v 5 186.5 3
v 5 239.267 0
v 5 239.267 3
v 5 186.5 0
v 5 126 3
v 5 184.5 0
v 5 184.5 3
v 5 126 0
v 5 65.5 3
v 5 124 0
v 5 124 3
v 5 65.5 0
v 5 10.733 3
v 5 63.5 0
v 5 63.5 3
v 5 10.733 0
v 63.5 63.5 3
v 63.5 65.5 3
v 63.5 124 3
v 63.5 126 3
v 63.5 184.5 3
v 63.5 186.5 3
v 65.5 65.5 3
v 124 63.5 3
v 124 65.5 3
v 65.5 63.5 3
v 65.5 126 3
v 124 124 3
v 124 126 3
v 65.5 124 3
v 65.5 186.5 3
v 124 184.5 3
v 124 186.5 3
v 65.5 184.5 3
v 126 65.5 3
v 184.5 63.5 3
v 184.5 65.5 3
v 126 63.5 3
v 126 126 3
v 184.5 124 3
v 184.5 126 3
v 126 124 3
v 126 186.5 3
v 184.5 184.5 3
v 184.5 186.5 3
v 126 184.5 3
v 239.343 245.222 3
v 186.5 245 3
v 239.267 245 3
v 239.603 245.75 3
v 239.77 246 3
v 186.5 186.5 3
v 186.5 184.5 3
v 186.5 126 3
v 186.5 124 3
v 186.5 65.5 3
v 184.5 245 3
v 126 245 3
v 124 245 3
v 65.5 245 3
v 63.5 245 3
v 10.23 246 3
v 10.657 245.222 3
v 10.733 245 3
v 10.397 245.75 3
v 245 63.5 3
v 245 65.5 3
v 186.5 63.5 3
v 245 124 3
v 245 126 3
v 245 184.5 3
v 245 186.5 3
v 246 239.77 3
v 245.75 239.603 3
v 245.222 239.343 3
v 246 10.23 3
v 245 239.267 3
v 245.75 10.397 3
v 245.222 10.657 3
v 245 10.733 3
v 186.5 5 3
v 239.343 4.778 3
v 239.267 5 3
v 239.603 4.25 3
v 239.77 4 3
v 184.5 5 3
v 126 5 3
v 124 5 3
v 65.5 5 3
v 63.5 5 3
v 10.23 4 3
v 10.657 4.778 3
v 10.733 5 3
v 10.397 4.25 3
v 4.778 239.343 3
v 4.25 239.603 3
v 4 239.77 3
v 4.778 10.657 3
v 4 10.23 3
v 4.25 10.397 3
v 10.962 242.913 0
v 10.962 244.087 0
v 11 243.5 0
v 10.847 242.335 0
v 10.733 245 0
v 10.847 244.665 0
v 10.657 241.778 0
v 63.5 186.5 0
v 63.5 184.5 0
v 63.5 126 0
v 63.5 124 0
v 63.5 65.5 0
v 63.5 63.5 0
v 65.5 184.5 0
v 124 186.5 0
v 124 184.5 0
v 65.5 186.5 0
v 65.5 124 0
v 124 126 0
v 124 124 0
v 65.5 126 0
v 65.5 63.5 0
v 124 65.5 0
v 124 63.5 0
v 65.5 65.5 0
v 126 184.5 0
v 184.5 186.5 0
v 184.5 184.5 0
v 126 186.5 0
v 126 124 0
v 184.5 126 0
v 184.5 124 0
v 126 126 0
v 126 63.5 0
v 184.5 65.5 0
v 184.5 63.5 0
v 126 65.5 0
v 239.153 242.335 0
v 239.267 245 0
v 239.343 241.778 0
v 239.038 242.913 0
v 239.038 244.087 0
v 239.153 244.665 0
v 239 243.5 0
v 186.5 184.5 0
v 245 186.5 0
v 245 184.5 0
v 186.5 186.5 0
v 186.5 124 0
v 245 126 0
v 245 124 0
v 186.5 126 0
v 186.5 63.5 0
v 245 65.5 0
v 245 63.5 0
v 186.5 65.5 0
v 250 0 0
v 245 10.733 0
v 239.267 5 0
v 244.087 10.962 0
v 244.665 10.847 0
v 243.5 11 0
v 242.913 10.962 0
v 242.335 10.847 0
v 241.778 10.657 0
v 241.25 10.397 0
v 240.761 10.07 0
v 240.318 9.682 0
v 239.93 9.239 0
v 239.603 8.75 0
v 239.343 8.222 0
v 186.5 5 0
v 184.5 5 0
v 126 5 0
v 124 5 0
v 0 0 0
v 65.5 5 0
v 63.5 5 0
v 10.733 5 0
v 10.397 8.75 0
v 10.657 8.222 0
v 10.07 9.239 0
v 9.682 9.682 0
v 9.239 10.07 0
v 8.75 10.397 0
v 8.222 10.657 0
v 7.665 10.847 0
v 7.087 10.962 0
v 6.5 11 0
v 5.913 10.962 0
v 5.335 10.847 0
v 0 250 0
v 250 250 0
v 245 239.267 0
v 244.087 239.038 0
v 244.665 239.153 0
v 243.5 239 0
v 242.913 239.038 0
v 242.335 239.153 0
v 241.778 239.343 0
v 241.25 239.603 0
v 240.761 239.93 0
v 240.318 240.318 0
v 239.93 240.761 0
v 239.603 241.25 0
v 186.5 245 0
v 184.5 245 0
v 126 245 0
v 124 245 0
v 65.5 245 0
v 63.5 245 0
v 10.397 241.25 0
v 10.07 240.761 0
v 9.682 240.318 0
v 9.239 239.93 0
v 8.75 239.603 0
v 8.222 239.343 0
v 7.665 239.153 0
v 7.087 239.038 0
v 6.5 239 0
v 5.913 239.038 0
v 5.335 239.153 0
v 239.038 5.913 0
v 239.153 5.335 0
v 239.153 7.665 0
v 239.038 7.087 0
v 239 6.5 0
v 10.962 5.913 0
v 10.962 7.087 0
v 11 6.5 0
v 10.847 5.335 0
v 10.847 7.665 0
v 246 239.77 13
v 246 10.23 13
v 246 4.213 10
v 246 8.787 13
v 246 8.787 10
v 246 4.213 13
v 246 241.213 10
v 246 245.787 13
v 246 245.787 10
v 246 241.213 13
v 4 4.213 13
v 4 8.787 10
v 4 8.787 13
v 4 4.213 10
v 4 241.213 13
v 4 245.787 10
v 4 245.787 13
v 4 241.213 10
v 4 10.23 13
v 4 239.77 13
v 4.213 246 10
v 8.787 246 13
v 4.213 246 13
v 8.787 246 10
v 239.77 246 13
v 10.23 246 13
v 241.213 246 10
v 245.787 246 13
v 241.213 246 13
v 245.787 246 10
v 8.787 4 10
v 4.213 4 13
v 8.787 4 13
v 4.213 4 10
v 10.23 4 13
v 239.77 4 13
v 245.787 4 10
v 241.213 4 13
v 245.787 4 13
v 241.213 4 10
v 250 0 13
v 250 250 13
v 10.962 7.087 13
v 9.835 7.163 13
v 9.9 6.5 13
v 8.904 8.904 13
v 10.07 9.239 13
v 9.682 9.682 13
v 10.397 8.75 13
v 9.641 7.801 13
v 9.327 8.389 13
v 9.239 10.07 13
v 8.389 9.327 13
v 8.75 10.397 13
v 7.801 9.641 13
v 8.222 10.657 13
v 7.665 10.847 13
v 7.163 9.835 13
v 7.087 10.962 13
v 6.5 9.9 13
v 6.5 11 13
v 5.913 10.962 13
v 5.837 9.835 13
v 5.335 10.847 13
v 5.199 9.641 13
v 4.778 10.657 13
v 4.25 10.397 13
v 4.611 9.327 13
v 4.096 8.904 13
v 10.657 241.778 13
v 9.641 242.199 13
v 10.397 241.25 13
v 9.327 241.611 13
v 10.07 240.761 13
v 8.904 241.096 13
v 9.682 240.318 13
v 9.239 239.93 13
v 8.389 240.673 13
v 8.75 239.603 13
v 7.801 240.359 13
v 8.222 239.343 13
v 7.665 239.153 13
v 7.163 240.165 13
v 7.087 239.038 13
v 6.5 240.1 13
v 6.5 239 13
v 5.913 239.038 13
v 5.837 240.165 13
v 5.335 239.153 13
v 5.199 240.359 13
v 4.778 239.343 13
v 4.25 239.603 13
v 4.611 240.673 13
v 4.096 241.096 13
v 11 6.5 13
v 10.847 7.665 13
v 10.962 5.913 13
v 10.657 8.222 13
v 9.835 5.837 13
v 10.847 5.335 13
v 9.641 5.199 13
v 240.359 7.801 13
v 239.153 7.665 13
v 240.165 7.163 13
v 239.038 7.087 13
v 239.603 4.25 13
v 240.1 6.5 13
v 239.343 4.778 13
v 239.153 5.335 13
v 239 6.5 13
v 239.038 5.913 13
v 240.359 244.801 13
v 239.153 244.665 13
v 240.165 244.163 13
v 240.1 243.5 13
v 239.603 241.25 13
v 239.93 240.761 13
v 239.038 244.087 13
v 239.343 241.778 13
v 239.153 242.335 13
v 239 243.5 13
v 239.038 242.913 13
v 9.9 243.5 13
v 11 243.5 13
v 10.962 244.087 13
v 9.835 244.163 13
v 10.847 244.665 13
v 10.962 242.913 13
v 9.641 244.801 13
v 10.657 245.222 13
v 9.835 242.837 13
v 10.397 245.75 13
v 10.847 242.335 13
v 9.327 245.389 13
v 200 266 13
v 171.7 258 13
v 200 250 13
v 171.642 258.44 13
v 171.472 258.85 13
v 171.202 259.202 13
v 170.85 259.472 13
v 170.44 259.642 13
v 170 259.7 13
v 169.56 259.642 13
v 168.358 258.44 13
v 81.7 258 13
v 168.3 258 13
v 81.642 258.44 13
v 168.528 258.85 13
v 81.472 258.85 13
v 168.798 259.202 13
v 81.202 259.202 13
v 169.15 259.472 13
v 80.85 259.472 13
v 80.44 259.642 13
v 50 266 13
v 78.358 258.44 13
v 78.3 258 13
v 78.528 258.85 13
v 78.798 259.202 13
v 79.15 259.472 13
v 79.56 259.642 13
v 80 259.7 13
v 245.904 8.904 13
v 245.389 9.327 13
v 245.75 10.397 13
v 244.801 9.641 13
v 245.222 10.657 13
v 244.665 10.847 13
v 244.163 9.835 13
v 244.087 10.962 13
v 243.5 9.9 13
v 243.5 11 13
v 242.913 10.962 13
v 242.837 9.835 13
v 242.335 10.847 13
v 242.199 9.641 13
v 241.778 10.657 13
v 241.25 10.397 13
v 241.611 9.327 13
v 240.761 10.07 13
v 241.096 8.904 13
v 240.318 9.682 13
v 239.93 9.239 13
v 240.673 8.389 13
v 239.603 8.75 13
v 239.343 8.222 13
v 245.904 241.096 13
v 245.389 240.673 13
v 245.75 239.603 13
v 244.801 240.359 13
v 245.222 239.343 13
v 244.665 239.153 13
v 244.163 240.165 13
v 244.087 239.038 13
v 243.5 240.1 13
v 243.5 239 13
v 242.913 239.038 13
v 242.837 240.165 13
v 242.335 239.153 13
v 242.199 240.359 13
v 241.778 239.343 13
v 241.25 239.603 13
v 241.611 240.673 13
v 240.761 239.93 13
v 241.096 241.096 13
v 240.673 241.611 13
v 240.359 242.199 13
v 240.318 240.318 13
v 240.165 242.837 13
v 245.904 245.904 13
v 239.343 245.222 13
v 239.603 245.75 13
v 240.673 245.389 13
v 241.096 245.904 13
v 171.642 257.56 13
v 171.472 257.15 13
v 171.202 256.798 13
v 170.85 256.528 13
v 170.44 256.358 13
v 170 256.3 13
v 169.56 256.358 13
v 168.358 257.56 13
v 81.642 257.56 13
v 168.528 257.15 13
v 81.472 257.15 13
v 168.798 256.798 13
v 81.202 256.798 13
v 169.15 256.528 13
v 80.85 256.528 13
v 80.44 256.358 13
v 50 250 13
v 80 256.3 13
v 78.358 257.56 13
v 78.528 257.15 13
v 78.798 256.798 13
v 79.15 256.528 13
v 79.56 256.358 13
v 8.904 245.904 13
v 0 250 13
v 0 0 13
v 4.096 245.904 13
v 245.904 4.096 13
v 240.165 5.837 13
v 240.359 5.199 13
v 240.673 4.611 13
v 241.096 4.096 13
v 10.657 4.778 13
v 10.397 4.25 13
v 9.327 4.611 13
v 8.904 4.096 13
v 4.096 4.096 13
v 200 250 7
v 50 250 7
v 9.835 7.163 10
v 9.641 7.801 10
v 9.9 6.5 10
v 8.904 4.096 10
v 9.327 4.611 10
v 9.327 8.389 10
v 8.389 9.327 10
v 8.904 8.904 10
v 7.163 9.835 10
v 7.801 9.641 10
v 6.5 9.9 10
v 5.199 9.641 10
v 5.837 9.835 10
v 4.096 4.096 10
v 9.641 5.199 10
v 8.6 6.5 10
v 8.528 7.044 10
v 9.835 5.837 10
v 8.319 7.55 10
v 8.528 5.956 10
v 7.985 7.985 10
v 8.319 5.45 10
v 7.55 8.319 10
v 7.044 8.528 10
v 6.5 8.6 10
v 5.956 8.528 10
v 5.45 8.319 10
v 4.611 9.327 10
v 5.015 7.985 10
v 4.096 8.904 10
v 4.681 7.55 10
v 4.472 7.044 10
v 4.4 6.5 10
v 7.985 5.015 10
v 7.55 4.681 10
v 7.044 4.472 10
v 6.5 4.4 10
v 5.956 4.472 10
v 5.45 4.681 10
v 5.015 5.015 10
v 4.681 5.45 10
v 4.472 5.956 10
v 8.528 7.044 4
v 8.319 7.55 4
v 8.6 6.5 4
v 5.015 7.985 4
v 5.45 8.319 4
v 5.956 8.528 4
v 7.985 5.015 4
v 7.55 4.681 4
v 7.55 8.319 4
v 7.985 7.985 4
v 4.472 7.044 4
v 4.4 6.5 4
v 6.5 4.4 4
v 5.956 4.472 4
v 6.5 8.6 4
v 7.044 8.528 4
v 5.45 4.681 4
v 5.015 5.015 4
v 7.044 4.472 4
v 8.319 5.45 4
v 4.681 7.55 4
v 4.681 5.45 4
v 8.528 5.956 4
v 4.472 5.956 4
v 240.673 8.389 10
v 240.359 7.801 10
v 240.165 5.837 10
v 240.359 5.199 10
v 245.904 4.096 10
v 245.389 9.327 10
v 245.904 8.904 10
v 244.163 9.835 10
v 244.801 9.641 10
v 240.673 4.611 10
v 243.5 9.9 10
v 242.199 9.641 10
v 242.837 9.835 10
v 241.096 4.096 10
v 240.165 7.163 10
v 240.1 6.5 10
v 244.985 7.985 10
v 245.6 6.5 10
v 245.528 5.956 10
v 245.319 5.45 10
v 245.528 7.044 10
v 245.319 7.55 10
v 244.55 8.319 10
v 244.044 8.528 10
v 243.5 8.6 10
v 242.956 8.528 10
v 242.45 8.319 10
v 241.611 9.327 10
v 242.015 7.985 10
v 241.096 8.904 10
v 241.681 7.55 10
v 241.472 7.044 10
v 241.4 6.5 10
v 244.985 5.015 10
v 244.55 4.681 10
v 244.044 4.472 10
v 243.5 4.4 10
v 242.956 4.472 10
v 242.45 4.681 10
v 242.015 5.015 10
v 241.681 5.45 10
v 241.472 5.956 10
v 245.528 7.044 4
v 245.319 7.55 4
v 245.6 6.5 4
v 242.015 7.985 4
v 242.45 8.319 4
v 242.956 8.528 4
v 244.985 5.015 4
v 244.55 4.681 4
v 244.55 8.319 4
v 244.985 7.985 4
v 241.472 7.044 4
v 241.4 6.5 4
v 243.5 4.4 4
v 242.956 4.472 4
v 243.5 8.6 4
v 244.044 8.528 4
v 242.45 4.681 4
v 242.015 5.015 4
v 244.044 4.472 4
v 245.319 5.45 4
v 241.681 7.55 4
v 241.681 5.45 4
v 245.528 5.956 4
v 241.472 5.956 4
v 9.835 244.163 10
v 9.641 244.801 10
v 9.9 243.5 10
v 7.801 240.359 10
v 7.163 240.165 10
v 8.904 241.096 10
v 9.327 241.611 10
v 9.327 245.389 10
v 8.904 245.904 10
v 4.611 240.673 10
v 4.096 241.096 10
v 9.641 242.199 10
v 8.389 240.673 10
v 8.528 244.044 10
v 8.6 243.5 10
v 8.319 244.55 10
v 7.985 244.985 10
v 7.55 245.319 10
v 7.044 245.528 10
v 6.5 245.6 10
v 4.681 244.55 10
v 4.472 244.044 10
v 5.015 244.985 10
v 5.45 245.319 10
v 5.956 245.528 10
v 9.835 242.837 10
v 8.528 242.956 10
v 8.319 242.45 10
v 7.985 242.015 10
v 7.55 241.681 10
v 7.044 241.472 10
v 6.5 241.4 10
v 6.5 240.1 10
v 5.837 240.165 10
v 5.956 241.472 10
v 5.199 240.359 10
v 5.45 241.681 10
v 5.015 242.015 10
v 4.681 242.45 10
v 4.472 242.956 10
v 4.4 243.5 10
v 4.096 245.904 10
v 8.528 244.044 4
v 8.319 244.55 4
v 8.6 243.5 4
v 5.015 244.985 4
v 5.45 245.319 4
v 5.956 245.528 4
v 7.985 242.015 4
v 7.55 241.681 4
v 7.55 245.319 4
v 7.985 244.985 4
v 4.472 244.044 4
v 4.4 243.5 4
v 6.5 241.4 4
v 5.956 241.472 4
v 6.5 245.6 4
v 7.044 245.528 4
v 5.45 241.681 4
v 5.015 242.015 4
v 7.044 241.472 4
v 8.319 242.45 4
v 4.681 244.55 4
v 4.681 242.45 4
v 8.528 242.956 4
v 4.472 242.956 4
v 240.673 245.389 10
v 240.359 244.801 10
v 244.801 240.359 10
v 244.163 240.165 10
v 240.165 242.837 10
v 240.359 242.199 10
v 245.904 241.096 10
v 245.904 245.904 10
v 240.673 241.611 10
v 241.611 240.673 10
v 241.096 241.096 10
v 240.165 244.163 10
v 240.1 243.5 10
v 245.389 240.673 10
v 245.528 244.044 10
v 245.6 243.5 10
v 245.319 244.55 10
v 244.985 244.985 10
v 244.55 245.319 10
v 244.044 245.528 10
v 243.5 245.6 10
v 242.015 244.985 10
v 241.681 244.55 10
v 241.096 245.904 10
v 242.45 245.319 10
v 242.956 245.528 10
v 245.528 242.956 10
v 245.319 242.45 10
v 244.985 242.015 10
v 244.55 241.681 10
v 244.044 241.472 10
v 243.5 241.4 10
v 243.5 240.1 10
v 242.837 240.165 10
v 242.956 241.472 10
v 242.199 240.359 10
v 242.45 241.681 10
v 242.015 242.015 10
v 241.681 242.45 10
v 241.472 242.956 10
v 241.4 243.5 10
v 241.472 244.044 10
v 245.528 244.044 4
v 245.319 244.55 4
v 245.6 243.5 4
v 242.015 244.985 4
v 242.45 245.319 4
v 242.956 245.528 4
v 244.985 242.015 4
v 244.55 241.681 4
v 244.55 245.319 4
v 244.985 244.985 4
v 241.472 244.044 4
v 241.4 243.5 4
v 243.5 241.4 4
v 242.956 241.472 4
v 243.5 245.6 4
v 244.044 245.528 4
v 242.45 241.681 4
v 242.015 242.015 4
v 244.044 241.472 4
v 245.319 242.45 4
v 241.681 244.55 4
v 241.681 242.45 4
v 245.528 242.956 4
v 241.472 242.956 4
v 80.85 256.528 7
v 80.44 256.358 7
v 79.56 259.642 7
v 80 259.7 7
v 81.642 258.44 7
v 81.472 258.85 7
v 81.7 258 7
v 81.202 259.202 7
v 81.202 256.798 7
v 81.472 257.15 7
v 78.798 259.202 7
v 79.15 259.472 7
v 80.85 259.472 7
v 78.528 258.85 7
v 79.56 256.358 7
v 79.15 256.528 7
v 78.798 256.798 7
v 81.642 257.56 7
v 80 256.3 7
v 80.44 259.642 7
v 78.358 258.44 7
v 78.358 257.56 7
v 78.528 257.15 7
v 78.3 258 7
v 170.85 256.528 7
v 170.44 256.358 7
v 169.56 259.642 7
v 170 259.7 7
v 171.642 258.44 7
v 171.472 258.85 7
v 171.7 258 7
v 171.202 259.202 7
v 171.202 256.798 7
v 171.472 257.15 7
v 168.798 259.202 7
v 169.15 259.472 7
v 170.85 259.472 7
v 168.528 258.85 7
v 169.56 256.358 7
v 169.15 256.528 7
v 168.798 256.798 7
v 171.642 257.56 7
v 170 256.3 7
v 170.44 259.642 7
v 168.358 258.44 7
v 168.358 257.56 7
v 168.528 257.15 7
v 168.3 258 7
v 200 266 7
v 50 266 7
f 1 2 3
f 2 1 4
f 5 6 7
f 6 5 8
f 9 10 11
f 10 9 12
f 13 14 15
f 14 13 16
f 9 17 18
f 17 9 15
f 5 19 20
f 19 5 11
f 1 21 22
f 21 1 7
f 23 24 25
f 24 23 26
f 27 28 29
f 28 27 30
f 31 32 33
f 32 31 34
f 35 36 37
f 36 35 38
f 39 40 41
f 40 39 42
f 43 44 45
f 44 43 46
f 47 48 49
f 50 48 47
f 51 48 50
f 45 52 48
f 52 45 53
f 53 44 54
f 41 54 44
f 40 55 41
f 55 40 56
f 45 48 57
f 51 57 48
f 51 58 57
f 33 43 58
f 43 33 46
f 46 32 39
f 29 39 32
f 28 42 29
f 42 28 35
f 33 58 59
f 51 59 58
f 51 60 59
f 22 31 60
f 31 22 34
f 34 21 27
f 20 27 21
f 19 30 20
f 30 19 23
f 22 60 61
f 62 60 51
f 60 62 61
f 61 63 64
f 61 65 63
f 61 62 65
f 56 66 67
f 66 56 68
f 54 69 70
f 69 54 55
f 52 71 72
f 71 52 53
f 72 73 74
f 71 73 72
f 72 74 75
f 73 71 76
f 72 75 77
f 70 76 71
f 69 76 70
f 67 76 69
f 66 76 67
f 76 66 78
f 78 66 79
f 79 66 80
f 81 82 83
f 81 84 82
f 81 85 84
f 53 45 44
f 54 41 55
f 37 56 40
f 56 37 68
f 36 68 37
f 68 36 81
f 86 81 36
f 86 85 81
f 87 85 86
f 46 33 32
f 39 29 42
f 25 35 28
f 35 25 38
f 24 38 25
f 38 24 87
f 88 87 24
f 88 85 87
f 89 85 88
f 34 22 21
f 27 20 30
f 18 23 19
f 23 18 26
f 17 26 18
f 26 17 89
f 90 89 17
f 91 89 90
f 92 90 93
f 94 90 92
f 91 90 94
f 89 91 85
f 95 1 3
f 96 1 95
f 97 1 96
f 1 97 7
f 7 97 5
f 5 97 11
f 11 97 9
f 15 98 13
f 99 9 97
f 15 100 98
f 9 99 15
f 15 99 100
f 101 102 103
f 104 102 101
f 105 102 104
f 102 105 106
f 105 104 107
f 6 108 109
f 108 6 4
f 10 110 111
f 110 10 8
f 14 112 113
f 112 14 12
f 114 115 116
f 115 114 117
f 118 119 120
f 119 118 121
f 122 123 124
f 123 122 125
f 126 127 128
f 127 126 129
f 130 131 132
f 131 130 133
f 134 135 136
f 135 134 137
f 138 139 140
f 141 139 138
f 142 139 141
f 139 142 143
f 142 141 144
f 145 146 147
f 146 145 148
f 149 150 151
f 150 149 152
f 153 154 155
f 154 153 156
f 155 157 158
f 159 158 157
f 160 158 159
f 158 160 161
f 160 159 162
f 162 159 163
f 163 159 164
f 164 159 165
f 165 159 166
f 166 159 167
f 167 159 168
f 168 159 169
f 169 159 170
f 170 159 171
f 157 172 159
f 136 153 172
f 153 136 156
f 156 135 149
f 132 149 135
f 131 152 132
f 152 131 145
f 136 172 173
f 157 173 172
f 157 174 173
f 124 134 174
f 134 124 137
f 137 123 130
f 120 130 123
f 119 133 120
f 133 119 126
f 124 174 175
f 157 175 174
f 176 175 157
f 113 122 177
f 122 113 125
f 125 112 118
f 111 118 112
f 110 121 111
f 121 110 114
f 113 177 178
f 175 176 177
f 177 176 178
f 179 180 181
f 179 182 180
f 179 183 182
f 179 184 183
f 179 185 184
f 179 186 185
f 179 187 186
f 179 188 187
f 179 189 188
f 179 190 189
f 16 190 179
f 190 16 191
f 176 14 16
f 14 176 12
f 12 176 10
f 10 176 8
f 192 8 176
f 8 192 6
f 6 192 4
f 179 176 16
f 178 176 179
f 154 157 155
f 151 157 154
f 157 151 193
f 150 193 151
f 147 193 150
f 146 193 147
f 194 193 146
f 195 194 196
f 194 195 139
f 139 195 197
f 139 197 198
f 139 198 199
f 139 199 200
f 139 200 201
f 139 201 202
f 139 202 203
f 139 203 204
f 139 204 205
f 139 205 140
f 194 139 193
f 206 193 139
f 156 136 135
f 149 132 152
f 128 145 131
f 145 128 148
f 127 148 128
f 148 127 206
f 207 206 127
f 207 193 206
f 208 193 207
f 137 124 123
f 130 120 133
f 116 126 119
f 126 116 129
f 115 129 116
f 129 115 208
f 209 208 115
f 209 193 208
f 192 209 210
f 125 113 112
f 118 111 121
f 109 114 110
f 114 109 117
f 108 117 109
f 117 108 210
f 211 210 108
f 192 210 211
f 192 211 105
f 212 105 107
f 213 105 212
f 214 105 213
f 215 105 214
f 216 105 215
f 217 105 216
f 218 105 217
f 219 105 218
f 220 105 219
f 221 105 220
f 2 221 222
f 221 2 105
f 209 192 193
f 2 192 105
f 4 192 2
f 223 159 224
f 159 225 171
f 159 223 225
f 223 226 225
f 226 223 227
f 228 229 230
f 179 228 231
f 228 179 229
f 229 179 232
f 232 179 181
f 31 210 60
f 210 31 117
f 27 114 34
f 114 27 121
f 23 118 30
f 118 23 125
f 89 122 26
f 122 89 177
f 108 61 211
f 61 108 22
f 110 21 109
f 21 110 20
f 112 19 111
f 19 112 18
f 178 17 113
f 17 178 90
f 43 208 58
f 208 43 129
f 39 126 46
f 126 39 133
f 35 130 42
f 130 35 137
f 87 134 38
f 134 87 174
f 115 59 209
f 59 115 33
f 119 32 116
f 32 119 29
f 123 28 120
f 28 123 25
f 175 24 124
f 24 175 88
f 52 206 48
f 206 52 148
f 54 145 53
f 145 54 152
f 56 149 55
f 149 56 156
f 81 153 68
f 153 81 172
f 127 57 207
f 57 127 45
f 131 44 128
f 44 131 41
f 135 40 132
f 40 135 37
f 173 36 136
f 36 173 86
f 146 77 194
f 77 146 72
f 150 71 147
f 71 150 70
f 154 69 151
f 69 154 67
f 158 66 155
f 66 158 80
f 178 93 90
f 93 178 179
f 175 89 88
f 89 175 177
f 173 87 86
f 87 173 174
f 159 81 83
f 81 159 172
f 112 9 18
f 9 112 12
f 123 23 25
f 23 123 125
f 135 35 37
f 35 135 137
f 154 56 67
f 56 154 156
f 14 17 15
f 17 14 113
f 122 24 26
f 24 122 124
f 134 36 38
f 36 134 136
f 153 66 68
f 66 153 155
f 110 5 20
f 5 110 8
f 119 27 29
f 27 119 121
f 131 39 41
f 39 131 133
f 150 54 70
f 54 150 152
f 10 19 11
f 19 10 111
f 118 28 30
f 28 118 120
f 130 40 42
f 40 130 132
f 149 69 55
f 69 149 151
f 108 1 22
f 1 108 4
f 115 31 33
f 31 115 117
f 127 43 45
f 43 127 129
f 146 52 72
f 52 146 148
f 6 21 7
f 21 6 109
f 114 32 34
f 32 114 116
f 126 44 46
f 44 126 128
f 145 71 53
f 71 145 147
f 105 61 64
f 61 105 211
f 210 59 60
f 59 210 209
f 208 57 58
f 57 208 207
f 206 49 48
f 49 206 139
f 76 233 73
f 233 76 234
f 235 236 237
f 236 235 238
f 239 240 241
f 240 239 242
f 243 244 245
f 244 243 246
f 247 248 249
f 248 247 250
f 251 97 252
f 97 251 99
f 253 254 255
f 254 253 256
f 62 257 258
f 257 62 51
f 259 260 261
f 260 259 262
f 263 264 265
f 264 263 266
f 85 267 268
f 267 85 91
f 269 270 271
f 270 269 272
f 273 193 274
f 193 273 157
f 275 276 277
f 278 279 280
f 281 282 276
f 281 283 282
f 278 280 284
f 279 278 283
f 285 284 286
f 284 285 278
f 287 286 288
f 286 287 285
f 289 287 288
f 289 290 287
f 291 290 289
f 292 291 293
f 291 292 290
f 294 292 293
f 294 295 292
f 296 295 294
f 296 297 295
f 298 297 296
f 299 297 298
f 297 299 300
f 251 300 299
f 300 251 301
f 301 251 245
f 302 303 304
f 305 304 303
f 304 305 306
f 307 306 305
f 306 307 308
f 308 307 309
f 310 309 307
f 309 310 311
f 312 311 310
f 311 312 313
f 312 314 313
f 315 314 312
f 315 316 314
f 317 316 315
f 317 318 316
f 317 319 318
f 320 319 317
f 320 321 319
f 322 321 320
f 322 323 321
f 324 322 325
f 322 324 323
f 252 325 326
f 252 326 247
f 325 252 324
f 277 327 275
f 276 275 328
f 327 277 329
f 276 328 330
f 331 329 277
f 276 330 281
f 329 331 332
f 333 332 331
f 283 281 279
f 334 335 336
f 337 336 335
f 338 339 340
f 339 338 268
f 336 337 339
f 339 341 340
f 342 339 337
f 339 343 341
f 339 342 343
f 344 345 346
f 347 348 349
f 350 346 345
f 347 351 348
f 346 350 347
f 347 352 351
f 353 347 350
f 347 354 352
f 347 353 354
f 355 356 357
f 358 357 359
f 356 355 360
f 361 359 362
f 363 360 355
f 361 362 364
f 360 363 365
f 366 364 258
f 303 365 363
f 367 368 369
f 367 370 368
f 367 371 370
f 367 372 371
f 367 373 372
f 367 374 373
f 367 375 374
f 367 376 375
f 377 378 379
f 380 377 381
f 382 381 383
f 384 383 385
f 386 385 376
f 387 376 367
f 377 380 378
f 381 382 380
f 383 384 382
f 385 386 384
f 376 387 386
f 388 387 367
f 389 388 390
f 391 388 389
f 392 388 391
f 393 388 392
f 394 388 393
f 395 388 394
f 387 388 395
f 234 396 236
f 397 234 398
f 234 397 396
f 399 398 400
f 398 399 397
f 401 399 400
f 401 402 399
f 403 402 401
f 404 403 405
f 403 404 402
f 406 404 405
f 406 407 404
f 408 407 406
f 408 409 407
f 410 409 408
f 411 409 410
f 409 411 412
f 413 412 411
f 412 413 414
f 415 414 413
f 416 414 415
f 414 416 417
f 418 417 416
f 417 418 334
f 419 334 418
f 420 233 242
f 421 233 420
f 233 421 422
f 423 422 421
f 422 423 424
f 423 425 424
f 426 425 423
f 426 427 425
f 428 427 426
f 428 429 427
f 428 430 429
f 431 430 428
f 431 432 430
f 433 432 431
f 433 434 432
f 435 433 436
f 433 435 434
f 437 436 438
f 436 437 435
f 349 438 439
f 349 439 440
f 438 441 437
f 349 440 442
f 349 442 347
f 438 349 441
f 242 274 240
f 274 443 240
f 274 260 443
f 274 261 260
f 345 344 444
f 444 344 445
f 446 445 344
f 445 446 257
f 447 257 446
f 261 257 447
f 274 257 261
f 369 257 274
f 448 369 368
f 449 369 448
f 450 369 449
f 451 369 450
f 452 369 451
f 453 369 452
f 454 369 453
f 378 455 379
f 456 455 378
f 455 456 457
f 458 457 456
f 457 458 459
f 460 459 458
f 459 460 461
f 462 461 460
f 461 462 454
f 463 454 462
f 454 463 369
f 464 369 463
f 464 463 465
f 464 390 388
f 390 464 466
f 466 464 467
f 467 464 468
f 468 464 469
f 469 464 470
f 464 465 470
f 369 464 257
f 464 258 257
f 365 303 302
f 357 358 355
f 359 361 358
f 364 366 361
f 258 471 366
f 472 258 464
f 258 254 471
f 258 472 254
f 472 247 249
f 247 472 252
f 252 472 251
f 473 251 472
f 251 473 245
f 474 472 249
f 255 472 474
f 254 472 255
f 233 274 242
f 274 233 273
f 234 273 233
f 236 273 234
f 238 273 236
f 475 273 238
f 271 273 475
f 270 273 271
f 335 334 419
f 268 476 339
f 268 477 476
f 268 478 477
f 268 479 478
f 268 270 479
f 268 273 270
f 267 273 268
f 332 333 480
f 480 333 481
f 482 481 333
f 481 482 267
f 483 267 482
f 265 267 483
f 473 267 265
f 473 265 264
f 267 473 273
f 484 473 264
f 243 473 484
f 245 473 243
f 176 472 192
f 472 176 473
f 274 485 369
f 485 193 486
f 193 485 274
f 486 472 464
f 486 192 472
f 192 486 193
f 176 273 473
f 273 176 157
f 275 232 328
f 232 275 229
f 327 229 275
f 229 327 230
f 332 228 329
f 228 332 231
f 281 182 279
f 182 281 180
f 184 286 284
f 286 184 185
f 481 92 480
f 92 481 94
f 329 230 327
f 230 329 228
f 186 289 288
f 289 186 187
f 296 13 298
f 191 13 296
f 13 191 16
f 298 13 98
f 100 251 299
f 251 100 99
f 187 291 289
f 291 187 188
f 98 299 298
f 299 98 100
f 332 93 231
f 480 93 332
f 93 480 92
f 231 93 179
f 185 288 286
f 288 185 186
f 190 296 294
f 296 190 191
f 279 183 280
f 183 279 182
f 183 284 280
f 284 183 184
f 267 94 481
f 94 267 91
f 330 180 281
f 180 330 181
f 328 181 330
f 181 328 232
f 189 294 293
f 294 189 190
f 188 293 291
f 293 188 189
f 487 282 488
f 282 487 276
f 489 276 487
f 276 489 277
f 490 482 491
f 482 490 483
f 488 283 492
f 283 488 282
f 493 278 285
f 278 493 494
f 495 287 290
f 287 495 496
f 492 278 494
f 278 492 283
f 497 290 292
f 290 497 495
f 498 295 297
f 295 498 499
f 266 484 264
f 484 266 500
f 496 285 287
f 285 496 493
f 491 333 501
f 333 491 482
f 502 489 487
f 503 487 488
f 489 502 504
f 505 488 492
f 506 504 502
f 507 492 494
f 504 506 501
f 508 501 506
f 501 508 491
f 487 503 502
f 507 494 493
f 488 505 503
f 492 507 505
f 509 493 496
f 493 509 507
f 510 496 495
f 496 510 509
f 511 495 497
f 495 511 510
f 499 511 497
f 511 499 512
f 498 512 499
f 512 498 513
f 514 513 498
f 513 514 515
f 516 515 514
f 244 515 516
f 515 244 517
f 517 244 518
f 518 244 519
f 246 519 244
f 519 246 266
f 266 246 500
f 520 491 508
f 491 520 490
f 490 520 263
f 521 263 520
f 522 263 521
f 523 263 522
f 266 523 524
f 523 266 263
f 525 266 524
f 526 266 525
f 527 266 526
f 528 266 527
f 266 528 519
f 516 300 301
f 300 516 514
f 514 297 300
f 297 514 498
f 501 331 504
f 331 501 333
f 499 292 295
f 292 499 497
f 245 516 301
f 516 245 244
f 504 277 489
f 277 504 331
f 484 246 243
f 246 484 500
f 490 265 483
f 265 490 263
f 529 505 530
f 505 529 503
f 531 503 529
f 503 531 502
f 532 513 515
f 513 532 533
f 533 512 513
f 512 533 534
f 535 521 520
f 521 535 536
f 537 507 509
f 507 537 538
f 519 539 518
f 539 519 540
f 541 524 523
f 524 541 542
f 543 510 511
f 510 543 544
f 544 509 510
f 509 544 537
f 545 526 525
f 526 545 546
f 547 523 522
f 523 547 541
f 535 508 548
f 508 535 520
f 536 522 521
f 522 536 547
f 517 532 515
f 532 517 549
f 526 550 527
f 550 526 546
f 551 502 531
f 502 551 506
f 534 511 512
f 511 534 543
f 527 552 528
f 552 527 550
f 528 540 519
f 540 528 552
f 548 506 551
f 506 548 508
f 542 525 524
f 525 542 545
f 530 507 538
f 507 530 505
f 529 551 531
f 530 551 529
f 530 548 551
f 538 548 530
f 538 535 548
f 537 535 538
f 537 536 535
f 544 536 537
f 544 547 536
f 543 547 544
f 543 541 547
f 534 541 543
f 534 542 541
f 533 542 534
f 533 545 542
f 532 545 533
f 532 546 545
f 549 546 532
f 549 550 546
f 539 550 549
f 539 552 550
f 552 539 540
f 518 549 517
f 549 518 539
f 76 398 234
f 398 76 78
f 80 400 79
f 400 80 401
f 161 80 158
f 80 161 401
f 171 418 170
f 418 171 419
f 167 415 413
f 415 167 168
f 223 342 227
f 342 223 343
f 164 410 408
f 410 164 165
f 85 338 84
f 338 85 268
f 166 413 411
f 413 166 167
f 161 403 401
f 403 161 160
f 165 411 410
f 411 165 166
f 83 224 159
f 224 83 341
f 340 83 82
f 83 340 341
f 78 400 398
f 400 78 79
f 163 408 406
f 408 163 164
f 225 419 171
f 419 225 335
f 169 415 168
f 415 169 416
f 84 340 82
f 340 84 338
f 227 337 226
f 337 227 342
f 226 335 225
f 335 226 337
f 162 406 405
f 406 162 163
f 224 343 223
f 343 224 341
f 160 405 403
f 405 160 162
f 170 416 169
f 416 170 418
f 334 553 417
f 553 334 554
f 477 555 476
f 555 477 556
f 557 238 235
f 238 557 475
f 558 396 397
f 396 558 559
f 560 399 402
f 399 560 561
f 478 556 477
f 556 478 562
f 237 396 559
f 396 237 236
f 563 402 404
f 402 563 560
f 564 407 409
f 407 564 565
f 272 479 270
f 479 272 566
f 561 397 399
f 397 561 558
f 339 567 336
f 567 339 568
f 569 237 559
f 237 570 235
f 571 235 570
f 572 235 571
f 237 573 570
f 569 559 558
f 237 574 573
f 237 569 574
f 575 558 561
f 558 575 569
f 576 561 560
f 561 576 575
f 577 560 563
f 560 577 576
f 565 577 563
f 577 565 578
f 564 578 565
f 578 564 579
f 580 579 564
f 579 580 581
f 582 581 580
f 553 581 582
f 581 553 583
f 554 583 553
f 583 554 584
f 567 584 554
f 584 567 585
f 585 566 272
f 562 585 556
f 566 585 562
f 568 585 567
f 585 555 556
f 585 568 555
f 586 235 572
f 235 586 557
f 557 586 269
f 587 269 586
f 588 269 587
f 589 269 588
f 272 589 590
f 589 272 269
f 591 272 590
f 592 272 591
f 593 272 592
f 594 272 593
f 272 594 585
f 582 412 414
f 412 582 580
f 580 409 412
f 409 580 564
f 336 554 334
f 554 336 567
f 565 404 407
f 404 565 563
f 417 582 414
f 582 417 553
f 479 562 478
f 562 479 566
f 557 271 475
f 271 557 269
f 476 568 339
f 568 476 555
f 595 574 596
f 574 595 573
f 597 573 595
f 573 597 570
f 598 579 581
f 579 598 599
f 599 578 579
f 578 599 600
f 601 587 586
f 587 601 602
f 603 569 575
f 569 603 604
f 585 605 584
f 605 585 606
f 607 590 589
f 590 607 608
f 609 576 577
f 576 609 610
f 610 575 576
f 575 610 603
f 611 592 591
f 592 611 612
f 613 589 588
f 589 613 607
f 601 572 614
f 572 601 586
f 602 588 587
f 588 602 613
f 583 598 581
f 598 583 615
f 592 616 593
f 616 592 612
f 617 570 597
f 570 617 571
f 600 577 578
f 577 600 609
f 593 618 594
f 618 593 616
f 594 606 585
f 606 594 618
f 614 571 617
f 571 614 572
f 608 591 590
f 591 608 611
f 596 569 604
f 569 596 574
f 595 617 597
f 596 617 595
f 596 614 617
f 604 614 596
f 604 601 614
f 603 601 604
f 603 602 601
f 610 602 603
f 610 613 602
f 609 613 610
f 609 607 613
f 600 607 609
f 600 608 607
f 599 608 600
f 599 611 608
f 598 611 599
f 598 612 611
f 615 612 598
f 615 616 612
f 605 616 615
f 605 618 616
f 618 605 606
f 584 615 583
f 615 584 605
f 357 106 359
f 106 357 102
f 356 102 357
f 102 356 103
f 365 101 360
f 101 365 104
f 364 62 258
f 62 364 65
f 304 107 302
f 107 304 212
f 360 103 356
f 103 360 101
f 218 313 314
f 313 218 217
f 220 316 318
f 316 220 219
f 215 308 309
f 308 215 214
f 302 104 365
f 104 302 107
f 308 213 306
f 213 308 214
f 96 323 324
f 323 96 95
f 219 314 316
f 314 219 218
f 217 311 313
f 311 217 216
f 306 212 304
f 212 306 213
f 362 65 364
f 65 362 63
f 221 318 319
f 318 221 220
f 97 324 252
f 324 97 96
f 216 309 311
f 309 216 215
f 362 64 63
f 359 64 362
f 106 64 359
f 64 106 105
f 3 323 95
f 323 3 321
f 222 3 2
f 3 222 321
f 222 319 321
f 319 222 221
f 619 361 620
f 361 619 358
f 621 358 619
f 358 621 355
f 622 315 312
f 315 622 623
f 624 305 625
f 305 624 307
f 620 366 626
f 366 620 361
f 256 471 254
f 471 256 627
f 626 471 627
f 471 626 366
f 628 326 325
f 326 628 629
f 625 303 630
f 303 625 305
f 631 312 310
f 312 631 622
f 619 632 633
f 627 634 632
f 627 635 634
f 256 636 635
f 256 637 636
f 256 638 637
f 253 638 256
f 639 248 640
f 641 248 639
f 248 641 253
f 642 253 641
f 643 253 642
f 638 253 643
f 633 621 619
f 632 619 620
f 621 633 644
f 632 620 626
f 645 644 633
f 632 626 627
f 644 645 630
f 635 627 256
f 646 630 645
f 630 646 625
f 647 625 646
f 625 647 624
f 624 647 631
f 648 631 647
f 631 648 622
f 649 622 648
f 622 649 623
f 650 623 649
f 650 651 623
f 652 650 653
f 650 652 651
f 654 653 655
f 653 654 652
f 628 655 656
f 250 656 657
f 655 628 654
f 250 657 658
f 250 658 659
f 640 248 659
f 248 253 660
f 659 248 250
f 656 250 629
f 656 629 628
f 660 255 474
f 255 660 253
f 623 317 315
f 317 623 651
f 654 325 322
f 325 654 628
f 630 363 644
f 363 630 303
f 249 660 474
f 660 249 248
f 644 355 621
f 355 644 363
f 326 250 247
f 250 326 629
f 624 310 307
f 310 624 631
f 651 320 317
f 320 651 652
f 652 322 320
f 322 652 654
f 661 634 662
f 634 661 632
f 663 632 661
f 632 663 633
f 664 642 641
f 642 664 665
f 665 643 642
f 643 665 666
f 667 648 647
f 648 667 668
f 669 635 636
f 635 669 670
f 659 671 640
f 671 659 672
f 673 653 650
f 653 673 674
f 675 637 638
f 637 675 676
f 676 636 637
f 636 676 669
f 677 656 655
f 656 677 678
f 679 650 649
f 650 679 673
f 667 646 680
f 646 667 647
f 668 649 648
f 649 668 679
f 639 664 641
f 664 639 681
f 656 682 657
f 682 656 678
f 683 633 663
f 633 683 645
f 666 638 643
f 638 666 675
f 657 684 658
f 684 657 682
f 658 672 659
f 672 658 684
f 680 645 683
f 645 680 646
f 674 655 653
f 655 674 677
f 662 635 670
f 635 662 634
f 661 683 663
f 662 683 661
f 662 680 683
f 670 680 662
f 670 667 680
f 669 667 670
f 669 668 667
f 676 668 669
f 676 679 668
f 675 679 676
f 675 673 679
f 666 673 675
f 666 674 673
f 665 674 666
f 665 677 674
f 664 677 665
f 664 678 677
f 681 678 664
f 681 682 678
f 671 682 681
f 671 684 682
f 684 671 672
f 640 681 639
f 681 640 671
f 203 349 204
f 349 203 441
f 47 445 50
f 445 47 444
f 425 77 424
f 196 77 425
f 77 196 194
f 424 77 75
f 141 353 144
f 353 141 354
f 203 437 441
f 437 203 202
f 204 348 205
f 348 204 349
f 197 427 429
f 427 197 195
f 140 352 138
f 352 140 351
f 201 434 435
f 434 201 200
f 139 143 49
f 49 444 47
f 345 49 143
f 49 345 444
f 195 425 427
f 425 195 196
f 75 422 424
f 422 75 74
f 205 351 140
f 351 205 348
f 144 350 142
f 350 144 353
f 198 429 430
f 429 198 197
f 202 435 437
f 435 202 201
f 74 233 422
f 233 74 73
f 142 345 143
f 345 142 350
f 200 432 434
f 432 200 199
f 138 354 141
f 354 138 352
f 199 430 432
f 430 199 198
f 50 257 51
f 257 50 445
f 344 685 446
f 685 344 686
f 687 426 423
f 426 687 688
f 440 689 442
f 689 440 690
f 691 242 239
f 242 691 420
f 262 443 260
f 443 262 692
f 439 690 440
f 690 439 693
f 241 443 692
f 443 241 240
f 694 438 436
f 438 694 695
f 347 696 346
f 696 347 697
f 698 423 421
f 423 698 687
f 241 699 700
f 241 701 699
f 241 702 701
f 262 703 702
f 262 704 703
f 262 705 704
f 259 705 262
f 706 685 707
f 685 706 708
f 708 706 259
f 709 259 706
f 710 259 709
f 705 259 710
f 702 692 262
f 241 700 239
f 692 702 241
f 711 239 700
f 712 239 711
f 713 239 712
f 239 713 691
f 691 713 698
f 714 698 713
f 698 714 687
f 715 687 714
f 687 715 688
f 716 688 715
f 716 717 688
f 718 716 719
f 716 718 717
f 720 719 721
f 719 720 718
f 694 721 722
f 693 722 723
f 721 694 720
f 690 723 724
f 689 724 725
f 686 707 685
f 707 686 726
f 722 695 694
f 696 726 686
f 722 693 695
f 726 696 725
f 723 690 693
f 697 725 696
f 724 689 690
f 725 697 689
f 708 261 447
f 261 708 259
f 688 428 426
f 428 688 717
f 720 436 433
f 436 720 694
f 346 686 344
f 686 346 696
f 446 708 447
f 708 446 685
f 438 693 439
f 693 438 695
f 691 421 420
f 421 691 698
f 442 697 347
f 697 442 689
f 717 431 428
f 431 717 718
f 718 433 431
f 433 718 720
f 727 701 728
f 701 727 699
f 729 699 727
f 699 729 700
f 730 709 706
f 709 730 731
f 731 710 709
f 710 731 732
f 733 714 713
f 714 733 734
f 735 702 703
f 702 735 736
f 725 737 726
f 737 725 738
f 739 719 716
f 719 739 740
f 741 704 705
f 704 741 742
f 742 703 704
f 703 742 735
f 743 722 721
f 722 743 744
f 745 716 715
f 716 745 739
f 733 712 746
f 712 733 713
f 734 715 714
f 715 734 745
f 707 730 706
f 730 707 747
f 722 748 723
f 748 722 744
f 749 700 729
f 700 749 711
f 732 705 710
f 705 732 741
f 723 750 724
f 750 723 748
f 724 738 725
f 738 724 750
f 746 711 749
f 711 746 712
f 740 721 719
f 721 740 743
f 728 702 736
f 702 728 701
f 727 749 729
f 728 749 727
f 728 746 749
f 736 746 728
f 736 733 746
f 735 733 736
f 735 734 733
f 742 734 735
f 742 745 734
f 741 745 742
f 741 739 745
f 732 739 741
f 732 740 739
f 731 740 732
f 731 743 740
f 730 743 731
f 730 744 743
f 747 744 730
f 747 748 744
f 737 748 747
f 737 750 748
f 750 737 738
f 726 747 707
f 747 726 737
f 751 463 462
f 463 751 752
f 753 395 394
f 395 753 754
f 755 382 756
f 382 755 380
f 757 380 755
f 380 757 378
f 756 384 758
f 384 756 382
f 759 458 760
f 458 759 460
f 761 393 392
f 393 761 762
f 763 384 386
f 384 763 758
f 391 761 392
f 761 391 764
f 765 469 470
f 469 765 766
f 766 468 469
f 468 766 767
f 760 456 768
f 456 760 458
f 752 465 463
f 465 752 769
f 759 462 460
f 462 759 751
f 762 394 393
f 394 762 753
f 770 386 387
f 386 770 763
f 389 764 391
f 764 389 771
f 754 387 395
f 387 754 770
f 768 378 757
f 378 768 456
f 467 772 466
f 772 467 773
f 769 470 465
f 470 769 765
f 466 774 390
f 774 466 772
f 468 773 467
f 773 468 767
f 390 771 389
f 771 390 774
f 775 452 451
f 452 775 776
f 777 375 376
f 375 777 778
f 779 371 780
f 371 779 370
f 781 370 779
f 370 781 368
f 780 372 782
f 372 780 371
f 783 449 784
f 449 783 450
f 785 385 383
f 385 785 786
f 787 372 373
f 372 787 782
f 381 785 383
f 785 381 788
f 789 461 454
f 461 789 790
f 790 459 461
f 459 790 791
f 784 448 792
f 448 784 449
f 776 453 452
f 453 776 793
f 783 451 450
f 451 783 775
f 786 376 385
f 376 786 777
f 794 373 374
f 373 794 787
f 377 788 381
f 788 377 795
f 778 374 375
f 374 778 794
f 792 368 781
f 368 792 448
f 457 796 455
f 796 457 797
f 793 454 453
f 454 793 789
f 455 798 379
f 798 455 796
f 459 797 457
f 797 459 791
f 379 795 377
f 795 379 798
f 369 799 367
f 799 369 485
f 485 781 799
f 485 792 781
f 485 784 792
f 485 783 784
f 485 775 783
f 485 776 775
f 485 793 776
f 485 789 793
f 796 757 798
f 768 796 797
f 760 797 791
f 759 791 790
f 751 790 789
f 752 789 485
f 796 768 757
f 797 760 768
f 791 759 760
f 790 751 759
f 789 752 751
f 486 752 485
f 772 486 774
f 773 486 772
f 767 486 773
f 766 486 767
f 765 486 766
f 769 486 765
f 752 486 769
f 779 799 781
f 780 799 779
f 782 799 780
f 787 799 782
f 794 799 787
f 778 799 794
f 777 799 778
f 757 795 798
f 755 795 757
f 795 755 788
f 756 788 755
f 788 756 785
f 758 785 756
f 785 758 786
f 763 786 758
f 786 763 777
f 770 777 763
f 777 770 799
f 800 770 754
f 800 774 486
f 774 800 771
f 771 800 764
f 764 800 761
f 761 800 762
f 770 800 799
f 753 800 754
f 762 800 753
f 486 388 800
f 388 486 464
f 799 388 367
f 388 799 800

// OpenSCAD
// =====================================================================
// FUZE / Helios — Down Sandwich Test Frame  (V3 clamshell, 2026-06-04)
// Two separate halves, NO printed hinge. Lift the lid right off to lay an
// even layer of free-form down in the tray; set the lid back (a perimeter
// set the lid back and clamp with 4 corner screws. Mesh on BOTH outer
// faces. Hangs vertically: a top rail slides into a side-loading C-channel.
//
//   PART = "tray"    -> deep half (10 mm down cavity)        [print 1]
//   PART = "lid"     -> mesh lid half                        [print 1]
//   PART = "channel" -> side-loading C-channel (load cell)   [print 1]
//   PART = "both"    -> tray + lid + channel preview
//
// Material: PC (PETG later). Print each half FLAT, mesh-face DOWN.
// MESH: pause-embed at layer 8 = Z 1.5 mm @ 0.2 mm layers (both halves).
// =====================================================================

PART = "tray";
$fn = 48;

SIZE     = 250;     // outer square (mm)
WALL     = 4;       // frame wall thickness
CAV      = 10;      // down cavity depth (tray)
FLOOR_H  = 3.0;     // mesh-support rib plane (1.5 backing + 1.5 cap, mesh @ layer 8)
RIB_W    = 2.0;     // rib width
CELLS    = 4;       // NxN support-rib cells
CLR      = 0.4;     // fit clearance

TRAY_T = FLOOR_H + CAV;   // tray wall height (13)
LID_RIM = 5.0;            // lid wall height
LID_T   = FLOOR_H + LID_RIM;


// corner closure screws (M3)
SCREW_CLR = 3.4;    // clearance hole (lid)
INSERT_D  = 4.2;    // M3 heat-set insert bore (tray)
INSERT_H  = 6.0;
BOSS_D    = 9;
INSET     = BOSS_D/2 + 2;   // boss center inset from the corner

// top hang tab (flat, in the plane of the frame, sticks OUT past the top edge so
// it never conflicts with the lid) + side-loading C-channel that grips the tab.
RAIL_LEN = 150;   // tab width along the top edge (X)
RAIL_OUT = 16;    // how far the tab sticks out past the top edge (Y)
RAIL_T   = 6;     // tab thickness (Z) — what the channel grips
CH_CLR = 0.5; CH_WALL = 3; CH_LEN = RAIL_LEN + 30;
// load-cell mount boss — stepped standoff on the BACK face (the face OPPOSITE the slot),
// so it mounts up to the load cell with the frame hanging straight down below it.
LC_TIP_W   = 8;     // tip width along the channel (X) — seats in the 8 mm gap between the load-cell screws
LC_BASE_W  = 16;    // shoulder width (X)
LC_TIP_ZH  = 8;     // tip height (Z)
LC_BASE_ZH = 10;    // shoulder height (Z)
LC_BASE_H  = 10;    // shoulder protrusion off the back face (+Y) — clears the 10 mm safety screw
LC_TIP_H   = 12;    // tip protrusion (+Y) total
LC_SCREW_D = 5.5;   // attach-screw clearance — SET to your load-cell thread (M5=5.5, M4=4.5, M6=6.5)
LC_HEAD_D  = 10;    // screw-head recess Ø
LC_HEAD_H  = 2.8;   // screw-head recess depth
// locking pins: 2 holes through channel-lip + tab + channel-lip; drop M3 screws/pins
LOCK_D    = 3.4;          // M3 clearance / 3 mm pin
LOCK_SP   = 90;           // spacing between the 2 lock holes
LOCK_Y    = RAIL_OUT/2;   // depth into the tab where the holes sit

WIN = SIZE - 2*WALL;
EPS = 0.01;

// ---------------------------------------------------------------
module sq(s,h){ cube([s,s,h]); }

module rib_grid(h){
    step = WIN/CELLS;
    intersection(){
        union(){
            for(i=[0:CELLS]) translate([i*step-RIB_W/2,0,0]) cube([RIB_W,WIN,h]);
            for(j=[0:CELLS]) translate([0,j*step-RIB_W/2,0]) cube([WIN,RIB_W,h]);
        }
        cube([WIN,WIN,h]);
    }
}
module ring(h){ difference(){ sq(SIZE,h); translate([WALL,WALL,-EPS]) sq(WIN,h+2*EPS);} }

// 4 corner positions
function corners() = [[INSET,INSET],[SIZE-INSET,INSET],[INSET,SIZE-INSET],[SIZE-INSET,SIZE-INSET]];

// registration via the corner bosses: lid POST drops into tray SOCKET, then screw.
// Socket and post are DECOUPLED so the post can shrink without re-cutting the tray.
REG_SOCKET_D = 6.8;   // TRAY socket diameter — UNCHANGED (matches the 6 trays already printed)
REG_POST_D   = 5.8;   // LID post diameter — loose slip fit (~0.5mm/side; was 6.5 = too tight)
REG_H        = 3.0;   // engagement depth (socket depth = post height)

module tray_bosses(){          // socket on top (receives the lid post) + insert below it
    for(c=corners()) translate([c[0],c[1],0])
        difference(){
            cylinder(d=BOSS_D,h=TRAY_T);
            translate([0,0,TRAY_T-REG_H]) cylinder(d=REG_SOCKET_D, h=REG_H+EPS, $fn=32);           // registration socket
            translate([0,0,TRAY_T-REG_H-INSERT_H]) cylinder(d=INSERT_D, h=INSERT_H+EPS, $fn=24);   // heat-set insert bore (below socket)
        }
}
module lid_bosses(){           // boss + registration POST above the mating face; screw hole through
    for(c=corners()) translate([c[0],c[1],0])
        difference(){
            union(){ cylinder(d=BOSS_D,h=LID_T); translate([0,0,LID_T-EPS]) cylinder(d=REG_POST_D, h=REG_H+EPS, $fn=32); }
            translate([0,0,-EPS]) cylinder(d=SCREW_CLR, h=LID_T+REG_H+2*EPS, $fn=24);
        }
}

// Flat hang tab: a plate sticking OUT past the top edge (+Y), thickness in Z.
// Sits at the top of the tray wall so the lid (which stacks in +Z) clears it.
module hang_tab(){
    difference(){
        translate([(SIZE-RAIL_LEN)/2, SIZE-EPS, TRAY_T-RAIL_T])
            cube([RAIL_LEN, RAIL_OUT+EPS, RAIL_T]);
        for(sx=[SIZE/2-LOCK_SP/2, SIZE/2+LOCK_SP/2])
            translate([sx, SIZE+LOCK_Y, TRAY_T-RAIL_T-EPS]) cylinder(d=LOCK_D, h=RAIL_T+2*EPS, $fn=24);
    }
}
// C-channel grips the tab top+bottom (Z) and the back (Y); the tab slides in from
// one X end to an end-stop; the front (toward the frame) is open so the neck passes.
module c_channel(){
    slotY = RAIL_OUT + CH_CLR;            // tab depth into the channel (Y)
    slotZ = RAIL_T + CH_CLR;              // tab thickness (Z)
    outerY = slotY + CH_WALL;             // back wall
    outerZ = slotZ + 2*CH_WALL;           // top + bottom lips
    ceil   = CH_WALL + slotZ;             // slot ceiling z
    difference(){
        union(){
            cube([CH_LEN, outerY, outerZ]);
            // stepped mount boss on the BACK (+Y) face, dead center, centered in height:
            // 16x10 shoulder (protrudes 0-10mm in +Y, clears the 10mm safety screw) ->
            // 8x8 tip (10-12mm, seats in the 8mm gap between the load-cell screws).
            translate([CH_LEN/2, outerY-EPS, outerZ/2]){
                translate([-LC_BASE_W/2, 0, -LC_BASE_ZH/2]) cube([LC_BASE_W, LC_BASE_H+EPS, LC_BASE_ZH]);
                translate([-LC_TIP_W/2, LC_BASE_H, -LC_TIP_ZH/2]) cube([LC_TIP_W, (LC_TIP_H-LC_BASE_H)+EPS, LC_TIP_ZH]);
            }
        }
        // tab slot: open at X=0 (insert) and Y=0 (front, frame hangs straight down out here); far X end = stop
        translate([-EPS, -EPS, CH_WALL]) cube([CH_LEN-CH_WALL, slotY, slotZ]);
        // LOCK holes (vertical) through top lip + tab + bottom lip, aligned at full seat
        for(sx=[(CH_LEN-CH_WALL)-RAIL_LEN/2 - LOCK_SP/2, (CH_LEN-CH_WALL)-RAIL_LEN/2 + LOCK_SP/2])
            translate([sx, LOCK_Y, -EPS]) cylinder(d=LOCK_D, h=outerZ+2*EPS, $fn=24);
        // ATTACH screw: +Y through the back wall + boss into the load-cell thread; head
        // recessed into the slot's back wall so it never blocks the sliding tab ("subset").
        translate([CH_LEN/2, slotY-EPS, outerZ/2]) rotate([-90,0,0]) cylinder(d=LC_SCREW_D, h=(outerY-slotY)+LC_TIP_H+2*EPS, $fn=32);
        translate([CH_LEN/2, slotY-EPS, outerZ/2]) rotate([-90,0,0]) cylinder(d=LC_HEAD_D, h=LC_HEAD_H+EPS, $fn=32);
    }
}

// ---------------- HALVES ----------------
module tray_half(){
    union(){
        translate([WALL,WALL,0]) rib_grid(FLOOR_H);
        ring(TRAY_T);
        tray_bosses();
        hang_tab();
    }
}
// coin-pry notches: bites out of the lid's top-outer edge at 2 opposite sides, so a
// coin/flat screwdriver slides into the seam against the tray edge and twists to pop apart.
PRY_W = 16; PRY_DEEP = 2.5; PRY_H = 4;
module pry_notches(){
    yc = SIZE/2;
    translate([-EPS,        yc-PRY_W/2, LID_T-PRY_H]) cube([PRY_DEEP+EPS, PRY_W, PRY_H+2*EPS]);   // left edge
    translate([SIZE-PRY_DEEP, yc-PRY_W/2, LID_T-PRY_H]) cube([PRY_DEEP+EPS, PRY_W, PRY_H+2*EPS]); // right edge
}
module lid_half(){
    difference(){
        union(){
            translate([WALL,WALL,0]) rib_grid(FLOOR_H);
            ring(LID_T);
            lid_bosses();
        }
        pry_notches();
    }
}

// ---------------- selector ----------------
if      (PART=="tray")    tray_half();
else if (PART=="lid")     lid_half();
else if (PART=="channel") c_channel();
else { tray_half(); translate([SIZE+30,0,0]) lid_half(); translate([0,-70,0]) c_channel(); }

// =====================================================================
// ASSEMBLY
// 1. Print tray + lid (mesh-face DOWN, pause layer 8 for mesh) + 1 C-channel, PC.
// 2. Stretch/embed bridal mesh on each rib grid.
// 3. Press 4x M3 heat-set inserts into the tray corner bosses.
// 4. Lay a standardized small even down layer in the tray. Set the lid on — the
//    align the 4 corner boss holes and drive 4x M3 into the tray inserts.
// 5. Bolt the C-channel to the inverted load cell; slide the tray's top rail in
//    from the open end to the end-stop; tare; run protocol.
// To reload: back out the 4 screws, lift the lid straight off.
// =====================================================================
